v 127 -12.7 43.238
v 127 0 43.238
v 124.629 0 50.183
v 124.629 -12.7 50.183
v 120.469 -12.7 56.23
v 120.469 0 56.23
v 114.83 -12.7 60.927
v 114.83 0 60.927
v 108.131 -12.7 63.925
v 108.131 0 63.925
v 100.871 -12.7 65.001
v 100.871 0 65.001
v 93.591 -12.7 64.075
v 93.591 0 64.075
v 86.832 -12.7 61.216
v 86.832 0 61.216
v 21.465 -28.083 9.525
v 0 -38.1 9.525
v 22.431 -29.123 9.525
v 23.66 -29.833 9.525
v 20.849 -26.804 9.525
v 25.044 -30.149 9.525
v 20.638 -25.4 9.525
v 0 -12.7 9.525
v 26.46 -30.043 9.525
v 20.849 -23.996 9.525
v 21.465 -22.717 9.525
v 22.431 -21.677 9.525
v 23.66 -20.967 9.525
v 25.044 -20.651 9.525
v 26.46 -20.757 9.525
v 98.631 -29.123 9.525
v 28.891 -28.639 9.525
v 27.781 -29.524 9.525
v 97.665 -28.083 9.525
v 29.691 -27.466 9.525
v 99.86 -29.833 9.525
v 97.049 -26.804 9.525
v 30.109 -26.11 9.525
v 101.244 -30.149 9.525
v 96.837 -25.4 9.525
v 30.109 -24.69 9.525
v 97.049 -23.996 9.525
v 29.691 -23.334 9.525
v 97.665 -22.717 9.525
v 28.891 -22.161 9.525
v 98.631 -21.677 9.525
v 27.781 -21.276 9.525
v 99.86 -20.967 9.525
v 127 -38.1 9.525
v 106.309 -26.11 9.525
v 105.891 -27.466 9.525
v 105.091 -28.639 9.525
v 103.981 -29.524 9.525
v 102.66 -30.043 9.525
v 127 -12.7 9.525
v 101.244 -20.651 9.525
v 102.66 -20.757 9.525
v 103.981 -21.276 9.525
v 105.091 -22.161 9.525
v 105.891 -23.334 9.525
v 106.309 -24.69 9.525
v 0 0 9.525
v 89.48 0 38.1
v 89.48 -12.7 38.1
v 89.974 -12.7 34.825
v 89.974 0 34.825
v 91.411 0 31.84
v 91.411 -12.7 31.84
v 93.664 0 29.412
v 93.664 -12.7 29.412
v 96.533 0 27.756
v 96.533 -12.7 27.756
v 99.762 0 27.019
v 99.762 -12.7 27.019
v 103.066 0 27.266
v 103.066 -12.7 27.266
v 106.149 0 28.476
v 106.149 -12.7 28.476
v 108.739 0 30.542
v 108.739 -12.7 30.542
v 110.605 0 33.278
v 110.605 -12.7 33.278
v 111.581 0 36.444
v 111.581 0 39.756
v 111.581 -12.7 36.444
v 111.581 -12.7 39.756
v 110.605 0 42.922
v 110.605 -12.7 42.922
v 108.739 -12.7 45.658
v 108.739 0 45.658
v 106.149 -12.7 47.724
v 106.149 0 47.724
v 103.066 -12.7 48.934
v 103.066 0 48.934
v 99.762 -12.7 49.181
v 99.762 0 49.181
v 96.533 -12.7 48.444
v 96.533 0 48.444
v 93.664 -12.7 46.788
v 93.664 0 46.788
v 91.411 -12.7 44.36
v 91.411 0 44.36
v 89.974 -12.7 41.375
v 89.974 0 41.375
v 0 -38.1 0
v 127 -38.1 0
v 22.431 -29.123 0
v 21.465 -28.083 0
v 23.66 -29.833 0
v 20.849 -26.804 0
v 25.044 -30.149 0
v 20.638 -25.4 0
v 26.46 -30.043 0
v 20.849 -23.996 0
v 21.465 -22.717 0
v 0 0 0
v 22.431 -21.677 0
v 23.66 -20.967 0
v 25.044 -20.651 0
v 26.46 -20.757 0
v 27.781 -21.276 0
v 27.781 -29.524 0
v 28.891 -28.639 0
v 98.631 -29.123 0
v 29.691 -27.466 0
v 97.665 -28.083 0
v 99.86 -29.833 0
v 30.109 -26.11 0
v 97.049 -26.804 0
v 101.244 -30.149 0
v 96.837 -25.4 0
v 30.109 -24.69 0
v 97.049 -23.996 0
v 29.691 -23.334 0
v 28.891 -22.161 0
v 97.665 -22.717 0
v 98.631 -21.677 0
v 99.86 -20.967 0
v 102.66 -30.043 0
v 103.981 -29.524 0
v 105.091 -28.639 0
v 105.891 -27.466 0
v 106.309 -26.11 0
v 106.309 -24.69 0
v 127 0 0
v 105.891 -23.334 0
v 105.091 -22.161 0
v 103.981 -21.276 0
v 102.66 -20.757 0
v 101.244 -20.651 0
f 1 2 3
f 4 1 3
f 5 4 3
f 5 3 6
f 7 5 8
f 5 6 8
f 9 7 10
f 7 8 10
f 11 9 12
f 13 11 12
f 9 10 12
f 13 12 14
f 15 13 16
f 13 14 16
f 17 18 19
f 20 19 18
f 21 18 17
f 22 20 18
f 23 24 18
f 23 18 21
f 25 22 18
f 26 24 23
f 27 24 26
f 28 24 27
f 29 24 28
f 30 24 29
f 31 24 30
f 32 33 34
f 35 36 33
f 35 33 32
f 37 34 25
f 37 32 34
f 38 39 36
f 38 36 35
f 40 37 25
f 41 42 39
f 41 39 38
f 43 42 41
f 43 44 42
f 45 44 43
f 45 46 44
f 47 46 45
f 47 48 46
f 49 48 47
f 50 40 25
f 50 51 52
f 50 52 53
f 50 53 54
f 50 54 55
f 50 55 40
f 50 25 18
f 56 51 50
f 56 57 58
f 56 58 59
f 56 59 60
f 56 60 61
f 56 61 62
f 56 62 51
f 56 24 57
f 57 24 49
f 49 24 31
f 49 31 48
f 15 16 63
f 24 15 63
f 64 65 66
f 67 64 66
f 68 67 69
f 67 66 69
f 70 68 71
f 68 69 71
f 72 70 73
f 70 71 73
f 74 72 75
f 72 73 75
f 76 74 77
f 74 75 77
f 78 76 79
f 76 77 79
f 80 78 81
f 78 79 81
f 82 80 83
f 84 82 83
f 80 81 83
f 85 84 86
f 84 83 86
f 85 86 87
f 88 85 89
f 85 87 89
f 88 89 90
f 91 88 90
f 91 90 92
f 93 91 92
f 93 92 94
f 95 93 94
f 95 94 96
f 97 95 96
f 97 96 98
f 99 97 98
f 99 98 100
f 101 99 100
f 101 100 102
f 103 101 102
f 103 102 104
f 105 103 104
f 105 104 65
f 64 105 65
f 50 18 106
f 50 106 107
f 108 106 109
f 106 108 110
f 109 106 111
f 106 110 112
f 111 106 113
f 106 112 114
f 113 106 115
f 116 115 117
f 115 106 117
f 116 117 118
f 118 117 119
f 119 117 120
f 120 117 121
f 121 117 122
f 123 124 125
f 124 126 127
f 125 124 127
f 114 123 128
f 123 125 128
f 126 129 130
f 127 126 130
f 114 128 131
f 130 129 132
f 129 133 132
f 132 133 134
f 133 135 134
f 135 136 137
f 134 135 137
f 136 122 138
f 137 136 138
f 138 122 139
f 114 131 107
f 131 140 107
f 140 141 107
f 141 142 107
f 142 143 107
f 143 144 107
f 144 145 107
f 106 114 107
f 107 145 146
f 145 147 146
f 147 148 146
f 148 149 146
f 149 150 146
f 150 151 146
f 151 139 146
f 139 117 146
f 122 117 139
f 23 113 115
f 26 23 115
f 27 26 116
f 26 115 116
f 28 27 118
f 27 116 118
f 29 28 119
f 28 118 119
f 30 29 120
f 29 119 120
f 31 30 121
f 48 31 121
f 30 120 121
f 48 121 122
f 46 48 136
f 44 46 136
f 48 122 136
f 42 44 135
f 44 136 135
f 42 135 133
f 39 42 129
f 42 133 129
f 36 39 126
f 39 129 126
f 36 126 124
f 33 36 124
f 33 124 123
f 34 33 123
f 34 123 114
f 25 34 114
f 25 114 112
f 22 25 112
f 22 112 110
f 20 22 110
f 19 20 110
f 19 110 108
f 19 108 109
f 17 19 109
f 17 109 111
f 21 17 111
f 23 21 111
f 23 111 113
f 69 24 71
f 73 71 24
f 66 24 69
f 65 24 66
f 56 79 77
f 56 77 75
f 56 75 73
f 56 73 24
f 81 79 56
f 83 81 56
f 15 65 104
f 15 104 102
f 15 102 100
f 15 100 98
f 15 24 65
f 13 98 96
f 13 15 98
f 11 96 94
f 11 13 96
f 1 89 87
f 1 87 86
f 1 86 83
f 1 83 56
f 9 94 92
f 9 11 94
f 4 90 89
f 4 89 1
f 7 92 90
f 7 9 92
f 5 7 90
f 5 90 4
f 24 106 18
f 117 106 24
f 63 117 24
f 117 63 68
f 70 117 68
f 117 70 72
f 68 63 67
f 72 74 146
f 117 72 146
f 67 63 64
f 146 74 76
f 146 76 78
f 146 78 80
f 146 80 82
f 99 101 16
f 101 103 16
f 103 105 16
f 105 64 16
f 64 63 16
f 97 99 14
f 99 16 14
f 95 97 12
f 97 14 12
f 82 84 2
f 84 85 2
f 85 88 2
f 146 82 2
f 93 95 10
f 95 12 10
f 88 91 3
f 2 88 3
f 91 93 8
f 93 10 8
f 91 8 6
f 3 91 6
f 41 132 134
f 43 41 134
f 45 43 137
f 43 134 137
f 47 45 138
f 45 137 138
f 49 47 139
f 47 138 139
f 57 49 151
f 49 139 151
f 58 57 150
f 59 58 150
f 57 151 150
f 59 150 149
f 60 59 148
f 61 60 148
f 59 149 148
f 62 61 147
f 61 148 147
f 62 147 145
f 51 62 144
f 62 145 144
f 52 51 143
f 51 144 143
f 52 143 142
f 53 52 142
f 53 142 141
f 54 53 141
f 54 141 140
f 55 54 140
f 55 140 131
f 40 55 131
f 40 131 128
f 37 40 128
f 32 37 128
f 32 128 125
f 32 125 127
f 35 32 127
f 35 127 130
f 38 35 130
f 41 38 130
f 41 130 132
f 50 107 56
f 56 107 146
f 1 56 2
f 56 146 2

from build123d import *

# Parameters (mm, degrees)
F0_W           = 127
F0_H           = 9.525
F1_DEPTH       = 38.1
F2_DEPTH       = 12.7
F3_D           = 22.225
F3_CBORE_D     = 22.225
F3_CBORE_DEPTH = 22.225
F5_D           = 9.525
F5_CBORE_D     = 9.525
F5_CBORE_DEPTH = 9.525
F6_D           = 9.525
F6_CBORE_D     = 9.525
F6_CBORE_DEPTH = 9.525


with BuildPart() as f1:
    # F0 (on Front) → F1 (new body)
    with BuildSketch(Plane.XZ):
        with Locations((63.5, 4.7625)):
            Rectangle(F0_W, F0_H)
    extrude(amount=F1_DEPTH)

    # F0 (on Front) → F2 (join)
    with BuildSketch(Plane.XZ):
        with BuildLine():
            Line((86.8315583768, 61.2163306665), (0, 9.525))
            Line((0, 9.525), (127, 9.525))
            Line((127, 9.525), (127, 32.9619213127))
            Line((127, 32.9619213127), (127, 43.2380786873))
            ThreePointArc((127, 43.2380786873), (111.5830167561, 62.6551183584), (86.8315583768, 61.2163306665))
        make_face()
    extrude(amount=F2_DEPTH)

    # F3 (through all)
    with Locations(Plane(origin=(0, 0, 0), x_dir=(1, 0, 0), z_dir=(0, 1, 0))):
        with Locations((100.5928441882, -38.1)):
            CounterBoreHole(F3_D / 2, F3_CBORE_D / 2, F3_CBORE_DEPTH)

    # F5 (through all)
    with Locations(Plane.XY.offset(9.525)):
        with Locations((25.4, -25.4)):
            CounterBoreHole(F5_D / 2, F5_CBORE_D / 2, F5_CBORE_DEPTH)

    # F6 (through all)
    with Locations(Plane.XY.offset(9.525)):
        with Locations((101.6, -25.4)):
            CounterBoreHole(F6_D / 2, F6_CBORE_D / 2, F6_CBORE_DEPTH)


solid = f1.part
